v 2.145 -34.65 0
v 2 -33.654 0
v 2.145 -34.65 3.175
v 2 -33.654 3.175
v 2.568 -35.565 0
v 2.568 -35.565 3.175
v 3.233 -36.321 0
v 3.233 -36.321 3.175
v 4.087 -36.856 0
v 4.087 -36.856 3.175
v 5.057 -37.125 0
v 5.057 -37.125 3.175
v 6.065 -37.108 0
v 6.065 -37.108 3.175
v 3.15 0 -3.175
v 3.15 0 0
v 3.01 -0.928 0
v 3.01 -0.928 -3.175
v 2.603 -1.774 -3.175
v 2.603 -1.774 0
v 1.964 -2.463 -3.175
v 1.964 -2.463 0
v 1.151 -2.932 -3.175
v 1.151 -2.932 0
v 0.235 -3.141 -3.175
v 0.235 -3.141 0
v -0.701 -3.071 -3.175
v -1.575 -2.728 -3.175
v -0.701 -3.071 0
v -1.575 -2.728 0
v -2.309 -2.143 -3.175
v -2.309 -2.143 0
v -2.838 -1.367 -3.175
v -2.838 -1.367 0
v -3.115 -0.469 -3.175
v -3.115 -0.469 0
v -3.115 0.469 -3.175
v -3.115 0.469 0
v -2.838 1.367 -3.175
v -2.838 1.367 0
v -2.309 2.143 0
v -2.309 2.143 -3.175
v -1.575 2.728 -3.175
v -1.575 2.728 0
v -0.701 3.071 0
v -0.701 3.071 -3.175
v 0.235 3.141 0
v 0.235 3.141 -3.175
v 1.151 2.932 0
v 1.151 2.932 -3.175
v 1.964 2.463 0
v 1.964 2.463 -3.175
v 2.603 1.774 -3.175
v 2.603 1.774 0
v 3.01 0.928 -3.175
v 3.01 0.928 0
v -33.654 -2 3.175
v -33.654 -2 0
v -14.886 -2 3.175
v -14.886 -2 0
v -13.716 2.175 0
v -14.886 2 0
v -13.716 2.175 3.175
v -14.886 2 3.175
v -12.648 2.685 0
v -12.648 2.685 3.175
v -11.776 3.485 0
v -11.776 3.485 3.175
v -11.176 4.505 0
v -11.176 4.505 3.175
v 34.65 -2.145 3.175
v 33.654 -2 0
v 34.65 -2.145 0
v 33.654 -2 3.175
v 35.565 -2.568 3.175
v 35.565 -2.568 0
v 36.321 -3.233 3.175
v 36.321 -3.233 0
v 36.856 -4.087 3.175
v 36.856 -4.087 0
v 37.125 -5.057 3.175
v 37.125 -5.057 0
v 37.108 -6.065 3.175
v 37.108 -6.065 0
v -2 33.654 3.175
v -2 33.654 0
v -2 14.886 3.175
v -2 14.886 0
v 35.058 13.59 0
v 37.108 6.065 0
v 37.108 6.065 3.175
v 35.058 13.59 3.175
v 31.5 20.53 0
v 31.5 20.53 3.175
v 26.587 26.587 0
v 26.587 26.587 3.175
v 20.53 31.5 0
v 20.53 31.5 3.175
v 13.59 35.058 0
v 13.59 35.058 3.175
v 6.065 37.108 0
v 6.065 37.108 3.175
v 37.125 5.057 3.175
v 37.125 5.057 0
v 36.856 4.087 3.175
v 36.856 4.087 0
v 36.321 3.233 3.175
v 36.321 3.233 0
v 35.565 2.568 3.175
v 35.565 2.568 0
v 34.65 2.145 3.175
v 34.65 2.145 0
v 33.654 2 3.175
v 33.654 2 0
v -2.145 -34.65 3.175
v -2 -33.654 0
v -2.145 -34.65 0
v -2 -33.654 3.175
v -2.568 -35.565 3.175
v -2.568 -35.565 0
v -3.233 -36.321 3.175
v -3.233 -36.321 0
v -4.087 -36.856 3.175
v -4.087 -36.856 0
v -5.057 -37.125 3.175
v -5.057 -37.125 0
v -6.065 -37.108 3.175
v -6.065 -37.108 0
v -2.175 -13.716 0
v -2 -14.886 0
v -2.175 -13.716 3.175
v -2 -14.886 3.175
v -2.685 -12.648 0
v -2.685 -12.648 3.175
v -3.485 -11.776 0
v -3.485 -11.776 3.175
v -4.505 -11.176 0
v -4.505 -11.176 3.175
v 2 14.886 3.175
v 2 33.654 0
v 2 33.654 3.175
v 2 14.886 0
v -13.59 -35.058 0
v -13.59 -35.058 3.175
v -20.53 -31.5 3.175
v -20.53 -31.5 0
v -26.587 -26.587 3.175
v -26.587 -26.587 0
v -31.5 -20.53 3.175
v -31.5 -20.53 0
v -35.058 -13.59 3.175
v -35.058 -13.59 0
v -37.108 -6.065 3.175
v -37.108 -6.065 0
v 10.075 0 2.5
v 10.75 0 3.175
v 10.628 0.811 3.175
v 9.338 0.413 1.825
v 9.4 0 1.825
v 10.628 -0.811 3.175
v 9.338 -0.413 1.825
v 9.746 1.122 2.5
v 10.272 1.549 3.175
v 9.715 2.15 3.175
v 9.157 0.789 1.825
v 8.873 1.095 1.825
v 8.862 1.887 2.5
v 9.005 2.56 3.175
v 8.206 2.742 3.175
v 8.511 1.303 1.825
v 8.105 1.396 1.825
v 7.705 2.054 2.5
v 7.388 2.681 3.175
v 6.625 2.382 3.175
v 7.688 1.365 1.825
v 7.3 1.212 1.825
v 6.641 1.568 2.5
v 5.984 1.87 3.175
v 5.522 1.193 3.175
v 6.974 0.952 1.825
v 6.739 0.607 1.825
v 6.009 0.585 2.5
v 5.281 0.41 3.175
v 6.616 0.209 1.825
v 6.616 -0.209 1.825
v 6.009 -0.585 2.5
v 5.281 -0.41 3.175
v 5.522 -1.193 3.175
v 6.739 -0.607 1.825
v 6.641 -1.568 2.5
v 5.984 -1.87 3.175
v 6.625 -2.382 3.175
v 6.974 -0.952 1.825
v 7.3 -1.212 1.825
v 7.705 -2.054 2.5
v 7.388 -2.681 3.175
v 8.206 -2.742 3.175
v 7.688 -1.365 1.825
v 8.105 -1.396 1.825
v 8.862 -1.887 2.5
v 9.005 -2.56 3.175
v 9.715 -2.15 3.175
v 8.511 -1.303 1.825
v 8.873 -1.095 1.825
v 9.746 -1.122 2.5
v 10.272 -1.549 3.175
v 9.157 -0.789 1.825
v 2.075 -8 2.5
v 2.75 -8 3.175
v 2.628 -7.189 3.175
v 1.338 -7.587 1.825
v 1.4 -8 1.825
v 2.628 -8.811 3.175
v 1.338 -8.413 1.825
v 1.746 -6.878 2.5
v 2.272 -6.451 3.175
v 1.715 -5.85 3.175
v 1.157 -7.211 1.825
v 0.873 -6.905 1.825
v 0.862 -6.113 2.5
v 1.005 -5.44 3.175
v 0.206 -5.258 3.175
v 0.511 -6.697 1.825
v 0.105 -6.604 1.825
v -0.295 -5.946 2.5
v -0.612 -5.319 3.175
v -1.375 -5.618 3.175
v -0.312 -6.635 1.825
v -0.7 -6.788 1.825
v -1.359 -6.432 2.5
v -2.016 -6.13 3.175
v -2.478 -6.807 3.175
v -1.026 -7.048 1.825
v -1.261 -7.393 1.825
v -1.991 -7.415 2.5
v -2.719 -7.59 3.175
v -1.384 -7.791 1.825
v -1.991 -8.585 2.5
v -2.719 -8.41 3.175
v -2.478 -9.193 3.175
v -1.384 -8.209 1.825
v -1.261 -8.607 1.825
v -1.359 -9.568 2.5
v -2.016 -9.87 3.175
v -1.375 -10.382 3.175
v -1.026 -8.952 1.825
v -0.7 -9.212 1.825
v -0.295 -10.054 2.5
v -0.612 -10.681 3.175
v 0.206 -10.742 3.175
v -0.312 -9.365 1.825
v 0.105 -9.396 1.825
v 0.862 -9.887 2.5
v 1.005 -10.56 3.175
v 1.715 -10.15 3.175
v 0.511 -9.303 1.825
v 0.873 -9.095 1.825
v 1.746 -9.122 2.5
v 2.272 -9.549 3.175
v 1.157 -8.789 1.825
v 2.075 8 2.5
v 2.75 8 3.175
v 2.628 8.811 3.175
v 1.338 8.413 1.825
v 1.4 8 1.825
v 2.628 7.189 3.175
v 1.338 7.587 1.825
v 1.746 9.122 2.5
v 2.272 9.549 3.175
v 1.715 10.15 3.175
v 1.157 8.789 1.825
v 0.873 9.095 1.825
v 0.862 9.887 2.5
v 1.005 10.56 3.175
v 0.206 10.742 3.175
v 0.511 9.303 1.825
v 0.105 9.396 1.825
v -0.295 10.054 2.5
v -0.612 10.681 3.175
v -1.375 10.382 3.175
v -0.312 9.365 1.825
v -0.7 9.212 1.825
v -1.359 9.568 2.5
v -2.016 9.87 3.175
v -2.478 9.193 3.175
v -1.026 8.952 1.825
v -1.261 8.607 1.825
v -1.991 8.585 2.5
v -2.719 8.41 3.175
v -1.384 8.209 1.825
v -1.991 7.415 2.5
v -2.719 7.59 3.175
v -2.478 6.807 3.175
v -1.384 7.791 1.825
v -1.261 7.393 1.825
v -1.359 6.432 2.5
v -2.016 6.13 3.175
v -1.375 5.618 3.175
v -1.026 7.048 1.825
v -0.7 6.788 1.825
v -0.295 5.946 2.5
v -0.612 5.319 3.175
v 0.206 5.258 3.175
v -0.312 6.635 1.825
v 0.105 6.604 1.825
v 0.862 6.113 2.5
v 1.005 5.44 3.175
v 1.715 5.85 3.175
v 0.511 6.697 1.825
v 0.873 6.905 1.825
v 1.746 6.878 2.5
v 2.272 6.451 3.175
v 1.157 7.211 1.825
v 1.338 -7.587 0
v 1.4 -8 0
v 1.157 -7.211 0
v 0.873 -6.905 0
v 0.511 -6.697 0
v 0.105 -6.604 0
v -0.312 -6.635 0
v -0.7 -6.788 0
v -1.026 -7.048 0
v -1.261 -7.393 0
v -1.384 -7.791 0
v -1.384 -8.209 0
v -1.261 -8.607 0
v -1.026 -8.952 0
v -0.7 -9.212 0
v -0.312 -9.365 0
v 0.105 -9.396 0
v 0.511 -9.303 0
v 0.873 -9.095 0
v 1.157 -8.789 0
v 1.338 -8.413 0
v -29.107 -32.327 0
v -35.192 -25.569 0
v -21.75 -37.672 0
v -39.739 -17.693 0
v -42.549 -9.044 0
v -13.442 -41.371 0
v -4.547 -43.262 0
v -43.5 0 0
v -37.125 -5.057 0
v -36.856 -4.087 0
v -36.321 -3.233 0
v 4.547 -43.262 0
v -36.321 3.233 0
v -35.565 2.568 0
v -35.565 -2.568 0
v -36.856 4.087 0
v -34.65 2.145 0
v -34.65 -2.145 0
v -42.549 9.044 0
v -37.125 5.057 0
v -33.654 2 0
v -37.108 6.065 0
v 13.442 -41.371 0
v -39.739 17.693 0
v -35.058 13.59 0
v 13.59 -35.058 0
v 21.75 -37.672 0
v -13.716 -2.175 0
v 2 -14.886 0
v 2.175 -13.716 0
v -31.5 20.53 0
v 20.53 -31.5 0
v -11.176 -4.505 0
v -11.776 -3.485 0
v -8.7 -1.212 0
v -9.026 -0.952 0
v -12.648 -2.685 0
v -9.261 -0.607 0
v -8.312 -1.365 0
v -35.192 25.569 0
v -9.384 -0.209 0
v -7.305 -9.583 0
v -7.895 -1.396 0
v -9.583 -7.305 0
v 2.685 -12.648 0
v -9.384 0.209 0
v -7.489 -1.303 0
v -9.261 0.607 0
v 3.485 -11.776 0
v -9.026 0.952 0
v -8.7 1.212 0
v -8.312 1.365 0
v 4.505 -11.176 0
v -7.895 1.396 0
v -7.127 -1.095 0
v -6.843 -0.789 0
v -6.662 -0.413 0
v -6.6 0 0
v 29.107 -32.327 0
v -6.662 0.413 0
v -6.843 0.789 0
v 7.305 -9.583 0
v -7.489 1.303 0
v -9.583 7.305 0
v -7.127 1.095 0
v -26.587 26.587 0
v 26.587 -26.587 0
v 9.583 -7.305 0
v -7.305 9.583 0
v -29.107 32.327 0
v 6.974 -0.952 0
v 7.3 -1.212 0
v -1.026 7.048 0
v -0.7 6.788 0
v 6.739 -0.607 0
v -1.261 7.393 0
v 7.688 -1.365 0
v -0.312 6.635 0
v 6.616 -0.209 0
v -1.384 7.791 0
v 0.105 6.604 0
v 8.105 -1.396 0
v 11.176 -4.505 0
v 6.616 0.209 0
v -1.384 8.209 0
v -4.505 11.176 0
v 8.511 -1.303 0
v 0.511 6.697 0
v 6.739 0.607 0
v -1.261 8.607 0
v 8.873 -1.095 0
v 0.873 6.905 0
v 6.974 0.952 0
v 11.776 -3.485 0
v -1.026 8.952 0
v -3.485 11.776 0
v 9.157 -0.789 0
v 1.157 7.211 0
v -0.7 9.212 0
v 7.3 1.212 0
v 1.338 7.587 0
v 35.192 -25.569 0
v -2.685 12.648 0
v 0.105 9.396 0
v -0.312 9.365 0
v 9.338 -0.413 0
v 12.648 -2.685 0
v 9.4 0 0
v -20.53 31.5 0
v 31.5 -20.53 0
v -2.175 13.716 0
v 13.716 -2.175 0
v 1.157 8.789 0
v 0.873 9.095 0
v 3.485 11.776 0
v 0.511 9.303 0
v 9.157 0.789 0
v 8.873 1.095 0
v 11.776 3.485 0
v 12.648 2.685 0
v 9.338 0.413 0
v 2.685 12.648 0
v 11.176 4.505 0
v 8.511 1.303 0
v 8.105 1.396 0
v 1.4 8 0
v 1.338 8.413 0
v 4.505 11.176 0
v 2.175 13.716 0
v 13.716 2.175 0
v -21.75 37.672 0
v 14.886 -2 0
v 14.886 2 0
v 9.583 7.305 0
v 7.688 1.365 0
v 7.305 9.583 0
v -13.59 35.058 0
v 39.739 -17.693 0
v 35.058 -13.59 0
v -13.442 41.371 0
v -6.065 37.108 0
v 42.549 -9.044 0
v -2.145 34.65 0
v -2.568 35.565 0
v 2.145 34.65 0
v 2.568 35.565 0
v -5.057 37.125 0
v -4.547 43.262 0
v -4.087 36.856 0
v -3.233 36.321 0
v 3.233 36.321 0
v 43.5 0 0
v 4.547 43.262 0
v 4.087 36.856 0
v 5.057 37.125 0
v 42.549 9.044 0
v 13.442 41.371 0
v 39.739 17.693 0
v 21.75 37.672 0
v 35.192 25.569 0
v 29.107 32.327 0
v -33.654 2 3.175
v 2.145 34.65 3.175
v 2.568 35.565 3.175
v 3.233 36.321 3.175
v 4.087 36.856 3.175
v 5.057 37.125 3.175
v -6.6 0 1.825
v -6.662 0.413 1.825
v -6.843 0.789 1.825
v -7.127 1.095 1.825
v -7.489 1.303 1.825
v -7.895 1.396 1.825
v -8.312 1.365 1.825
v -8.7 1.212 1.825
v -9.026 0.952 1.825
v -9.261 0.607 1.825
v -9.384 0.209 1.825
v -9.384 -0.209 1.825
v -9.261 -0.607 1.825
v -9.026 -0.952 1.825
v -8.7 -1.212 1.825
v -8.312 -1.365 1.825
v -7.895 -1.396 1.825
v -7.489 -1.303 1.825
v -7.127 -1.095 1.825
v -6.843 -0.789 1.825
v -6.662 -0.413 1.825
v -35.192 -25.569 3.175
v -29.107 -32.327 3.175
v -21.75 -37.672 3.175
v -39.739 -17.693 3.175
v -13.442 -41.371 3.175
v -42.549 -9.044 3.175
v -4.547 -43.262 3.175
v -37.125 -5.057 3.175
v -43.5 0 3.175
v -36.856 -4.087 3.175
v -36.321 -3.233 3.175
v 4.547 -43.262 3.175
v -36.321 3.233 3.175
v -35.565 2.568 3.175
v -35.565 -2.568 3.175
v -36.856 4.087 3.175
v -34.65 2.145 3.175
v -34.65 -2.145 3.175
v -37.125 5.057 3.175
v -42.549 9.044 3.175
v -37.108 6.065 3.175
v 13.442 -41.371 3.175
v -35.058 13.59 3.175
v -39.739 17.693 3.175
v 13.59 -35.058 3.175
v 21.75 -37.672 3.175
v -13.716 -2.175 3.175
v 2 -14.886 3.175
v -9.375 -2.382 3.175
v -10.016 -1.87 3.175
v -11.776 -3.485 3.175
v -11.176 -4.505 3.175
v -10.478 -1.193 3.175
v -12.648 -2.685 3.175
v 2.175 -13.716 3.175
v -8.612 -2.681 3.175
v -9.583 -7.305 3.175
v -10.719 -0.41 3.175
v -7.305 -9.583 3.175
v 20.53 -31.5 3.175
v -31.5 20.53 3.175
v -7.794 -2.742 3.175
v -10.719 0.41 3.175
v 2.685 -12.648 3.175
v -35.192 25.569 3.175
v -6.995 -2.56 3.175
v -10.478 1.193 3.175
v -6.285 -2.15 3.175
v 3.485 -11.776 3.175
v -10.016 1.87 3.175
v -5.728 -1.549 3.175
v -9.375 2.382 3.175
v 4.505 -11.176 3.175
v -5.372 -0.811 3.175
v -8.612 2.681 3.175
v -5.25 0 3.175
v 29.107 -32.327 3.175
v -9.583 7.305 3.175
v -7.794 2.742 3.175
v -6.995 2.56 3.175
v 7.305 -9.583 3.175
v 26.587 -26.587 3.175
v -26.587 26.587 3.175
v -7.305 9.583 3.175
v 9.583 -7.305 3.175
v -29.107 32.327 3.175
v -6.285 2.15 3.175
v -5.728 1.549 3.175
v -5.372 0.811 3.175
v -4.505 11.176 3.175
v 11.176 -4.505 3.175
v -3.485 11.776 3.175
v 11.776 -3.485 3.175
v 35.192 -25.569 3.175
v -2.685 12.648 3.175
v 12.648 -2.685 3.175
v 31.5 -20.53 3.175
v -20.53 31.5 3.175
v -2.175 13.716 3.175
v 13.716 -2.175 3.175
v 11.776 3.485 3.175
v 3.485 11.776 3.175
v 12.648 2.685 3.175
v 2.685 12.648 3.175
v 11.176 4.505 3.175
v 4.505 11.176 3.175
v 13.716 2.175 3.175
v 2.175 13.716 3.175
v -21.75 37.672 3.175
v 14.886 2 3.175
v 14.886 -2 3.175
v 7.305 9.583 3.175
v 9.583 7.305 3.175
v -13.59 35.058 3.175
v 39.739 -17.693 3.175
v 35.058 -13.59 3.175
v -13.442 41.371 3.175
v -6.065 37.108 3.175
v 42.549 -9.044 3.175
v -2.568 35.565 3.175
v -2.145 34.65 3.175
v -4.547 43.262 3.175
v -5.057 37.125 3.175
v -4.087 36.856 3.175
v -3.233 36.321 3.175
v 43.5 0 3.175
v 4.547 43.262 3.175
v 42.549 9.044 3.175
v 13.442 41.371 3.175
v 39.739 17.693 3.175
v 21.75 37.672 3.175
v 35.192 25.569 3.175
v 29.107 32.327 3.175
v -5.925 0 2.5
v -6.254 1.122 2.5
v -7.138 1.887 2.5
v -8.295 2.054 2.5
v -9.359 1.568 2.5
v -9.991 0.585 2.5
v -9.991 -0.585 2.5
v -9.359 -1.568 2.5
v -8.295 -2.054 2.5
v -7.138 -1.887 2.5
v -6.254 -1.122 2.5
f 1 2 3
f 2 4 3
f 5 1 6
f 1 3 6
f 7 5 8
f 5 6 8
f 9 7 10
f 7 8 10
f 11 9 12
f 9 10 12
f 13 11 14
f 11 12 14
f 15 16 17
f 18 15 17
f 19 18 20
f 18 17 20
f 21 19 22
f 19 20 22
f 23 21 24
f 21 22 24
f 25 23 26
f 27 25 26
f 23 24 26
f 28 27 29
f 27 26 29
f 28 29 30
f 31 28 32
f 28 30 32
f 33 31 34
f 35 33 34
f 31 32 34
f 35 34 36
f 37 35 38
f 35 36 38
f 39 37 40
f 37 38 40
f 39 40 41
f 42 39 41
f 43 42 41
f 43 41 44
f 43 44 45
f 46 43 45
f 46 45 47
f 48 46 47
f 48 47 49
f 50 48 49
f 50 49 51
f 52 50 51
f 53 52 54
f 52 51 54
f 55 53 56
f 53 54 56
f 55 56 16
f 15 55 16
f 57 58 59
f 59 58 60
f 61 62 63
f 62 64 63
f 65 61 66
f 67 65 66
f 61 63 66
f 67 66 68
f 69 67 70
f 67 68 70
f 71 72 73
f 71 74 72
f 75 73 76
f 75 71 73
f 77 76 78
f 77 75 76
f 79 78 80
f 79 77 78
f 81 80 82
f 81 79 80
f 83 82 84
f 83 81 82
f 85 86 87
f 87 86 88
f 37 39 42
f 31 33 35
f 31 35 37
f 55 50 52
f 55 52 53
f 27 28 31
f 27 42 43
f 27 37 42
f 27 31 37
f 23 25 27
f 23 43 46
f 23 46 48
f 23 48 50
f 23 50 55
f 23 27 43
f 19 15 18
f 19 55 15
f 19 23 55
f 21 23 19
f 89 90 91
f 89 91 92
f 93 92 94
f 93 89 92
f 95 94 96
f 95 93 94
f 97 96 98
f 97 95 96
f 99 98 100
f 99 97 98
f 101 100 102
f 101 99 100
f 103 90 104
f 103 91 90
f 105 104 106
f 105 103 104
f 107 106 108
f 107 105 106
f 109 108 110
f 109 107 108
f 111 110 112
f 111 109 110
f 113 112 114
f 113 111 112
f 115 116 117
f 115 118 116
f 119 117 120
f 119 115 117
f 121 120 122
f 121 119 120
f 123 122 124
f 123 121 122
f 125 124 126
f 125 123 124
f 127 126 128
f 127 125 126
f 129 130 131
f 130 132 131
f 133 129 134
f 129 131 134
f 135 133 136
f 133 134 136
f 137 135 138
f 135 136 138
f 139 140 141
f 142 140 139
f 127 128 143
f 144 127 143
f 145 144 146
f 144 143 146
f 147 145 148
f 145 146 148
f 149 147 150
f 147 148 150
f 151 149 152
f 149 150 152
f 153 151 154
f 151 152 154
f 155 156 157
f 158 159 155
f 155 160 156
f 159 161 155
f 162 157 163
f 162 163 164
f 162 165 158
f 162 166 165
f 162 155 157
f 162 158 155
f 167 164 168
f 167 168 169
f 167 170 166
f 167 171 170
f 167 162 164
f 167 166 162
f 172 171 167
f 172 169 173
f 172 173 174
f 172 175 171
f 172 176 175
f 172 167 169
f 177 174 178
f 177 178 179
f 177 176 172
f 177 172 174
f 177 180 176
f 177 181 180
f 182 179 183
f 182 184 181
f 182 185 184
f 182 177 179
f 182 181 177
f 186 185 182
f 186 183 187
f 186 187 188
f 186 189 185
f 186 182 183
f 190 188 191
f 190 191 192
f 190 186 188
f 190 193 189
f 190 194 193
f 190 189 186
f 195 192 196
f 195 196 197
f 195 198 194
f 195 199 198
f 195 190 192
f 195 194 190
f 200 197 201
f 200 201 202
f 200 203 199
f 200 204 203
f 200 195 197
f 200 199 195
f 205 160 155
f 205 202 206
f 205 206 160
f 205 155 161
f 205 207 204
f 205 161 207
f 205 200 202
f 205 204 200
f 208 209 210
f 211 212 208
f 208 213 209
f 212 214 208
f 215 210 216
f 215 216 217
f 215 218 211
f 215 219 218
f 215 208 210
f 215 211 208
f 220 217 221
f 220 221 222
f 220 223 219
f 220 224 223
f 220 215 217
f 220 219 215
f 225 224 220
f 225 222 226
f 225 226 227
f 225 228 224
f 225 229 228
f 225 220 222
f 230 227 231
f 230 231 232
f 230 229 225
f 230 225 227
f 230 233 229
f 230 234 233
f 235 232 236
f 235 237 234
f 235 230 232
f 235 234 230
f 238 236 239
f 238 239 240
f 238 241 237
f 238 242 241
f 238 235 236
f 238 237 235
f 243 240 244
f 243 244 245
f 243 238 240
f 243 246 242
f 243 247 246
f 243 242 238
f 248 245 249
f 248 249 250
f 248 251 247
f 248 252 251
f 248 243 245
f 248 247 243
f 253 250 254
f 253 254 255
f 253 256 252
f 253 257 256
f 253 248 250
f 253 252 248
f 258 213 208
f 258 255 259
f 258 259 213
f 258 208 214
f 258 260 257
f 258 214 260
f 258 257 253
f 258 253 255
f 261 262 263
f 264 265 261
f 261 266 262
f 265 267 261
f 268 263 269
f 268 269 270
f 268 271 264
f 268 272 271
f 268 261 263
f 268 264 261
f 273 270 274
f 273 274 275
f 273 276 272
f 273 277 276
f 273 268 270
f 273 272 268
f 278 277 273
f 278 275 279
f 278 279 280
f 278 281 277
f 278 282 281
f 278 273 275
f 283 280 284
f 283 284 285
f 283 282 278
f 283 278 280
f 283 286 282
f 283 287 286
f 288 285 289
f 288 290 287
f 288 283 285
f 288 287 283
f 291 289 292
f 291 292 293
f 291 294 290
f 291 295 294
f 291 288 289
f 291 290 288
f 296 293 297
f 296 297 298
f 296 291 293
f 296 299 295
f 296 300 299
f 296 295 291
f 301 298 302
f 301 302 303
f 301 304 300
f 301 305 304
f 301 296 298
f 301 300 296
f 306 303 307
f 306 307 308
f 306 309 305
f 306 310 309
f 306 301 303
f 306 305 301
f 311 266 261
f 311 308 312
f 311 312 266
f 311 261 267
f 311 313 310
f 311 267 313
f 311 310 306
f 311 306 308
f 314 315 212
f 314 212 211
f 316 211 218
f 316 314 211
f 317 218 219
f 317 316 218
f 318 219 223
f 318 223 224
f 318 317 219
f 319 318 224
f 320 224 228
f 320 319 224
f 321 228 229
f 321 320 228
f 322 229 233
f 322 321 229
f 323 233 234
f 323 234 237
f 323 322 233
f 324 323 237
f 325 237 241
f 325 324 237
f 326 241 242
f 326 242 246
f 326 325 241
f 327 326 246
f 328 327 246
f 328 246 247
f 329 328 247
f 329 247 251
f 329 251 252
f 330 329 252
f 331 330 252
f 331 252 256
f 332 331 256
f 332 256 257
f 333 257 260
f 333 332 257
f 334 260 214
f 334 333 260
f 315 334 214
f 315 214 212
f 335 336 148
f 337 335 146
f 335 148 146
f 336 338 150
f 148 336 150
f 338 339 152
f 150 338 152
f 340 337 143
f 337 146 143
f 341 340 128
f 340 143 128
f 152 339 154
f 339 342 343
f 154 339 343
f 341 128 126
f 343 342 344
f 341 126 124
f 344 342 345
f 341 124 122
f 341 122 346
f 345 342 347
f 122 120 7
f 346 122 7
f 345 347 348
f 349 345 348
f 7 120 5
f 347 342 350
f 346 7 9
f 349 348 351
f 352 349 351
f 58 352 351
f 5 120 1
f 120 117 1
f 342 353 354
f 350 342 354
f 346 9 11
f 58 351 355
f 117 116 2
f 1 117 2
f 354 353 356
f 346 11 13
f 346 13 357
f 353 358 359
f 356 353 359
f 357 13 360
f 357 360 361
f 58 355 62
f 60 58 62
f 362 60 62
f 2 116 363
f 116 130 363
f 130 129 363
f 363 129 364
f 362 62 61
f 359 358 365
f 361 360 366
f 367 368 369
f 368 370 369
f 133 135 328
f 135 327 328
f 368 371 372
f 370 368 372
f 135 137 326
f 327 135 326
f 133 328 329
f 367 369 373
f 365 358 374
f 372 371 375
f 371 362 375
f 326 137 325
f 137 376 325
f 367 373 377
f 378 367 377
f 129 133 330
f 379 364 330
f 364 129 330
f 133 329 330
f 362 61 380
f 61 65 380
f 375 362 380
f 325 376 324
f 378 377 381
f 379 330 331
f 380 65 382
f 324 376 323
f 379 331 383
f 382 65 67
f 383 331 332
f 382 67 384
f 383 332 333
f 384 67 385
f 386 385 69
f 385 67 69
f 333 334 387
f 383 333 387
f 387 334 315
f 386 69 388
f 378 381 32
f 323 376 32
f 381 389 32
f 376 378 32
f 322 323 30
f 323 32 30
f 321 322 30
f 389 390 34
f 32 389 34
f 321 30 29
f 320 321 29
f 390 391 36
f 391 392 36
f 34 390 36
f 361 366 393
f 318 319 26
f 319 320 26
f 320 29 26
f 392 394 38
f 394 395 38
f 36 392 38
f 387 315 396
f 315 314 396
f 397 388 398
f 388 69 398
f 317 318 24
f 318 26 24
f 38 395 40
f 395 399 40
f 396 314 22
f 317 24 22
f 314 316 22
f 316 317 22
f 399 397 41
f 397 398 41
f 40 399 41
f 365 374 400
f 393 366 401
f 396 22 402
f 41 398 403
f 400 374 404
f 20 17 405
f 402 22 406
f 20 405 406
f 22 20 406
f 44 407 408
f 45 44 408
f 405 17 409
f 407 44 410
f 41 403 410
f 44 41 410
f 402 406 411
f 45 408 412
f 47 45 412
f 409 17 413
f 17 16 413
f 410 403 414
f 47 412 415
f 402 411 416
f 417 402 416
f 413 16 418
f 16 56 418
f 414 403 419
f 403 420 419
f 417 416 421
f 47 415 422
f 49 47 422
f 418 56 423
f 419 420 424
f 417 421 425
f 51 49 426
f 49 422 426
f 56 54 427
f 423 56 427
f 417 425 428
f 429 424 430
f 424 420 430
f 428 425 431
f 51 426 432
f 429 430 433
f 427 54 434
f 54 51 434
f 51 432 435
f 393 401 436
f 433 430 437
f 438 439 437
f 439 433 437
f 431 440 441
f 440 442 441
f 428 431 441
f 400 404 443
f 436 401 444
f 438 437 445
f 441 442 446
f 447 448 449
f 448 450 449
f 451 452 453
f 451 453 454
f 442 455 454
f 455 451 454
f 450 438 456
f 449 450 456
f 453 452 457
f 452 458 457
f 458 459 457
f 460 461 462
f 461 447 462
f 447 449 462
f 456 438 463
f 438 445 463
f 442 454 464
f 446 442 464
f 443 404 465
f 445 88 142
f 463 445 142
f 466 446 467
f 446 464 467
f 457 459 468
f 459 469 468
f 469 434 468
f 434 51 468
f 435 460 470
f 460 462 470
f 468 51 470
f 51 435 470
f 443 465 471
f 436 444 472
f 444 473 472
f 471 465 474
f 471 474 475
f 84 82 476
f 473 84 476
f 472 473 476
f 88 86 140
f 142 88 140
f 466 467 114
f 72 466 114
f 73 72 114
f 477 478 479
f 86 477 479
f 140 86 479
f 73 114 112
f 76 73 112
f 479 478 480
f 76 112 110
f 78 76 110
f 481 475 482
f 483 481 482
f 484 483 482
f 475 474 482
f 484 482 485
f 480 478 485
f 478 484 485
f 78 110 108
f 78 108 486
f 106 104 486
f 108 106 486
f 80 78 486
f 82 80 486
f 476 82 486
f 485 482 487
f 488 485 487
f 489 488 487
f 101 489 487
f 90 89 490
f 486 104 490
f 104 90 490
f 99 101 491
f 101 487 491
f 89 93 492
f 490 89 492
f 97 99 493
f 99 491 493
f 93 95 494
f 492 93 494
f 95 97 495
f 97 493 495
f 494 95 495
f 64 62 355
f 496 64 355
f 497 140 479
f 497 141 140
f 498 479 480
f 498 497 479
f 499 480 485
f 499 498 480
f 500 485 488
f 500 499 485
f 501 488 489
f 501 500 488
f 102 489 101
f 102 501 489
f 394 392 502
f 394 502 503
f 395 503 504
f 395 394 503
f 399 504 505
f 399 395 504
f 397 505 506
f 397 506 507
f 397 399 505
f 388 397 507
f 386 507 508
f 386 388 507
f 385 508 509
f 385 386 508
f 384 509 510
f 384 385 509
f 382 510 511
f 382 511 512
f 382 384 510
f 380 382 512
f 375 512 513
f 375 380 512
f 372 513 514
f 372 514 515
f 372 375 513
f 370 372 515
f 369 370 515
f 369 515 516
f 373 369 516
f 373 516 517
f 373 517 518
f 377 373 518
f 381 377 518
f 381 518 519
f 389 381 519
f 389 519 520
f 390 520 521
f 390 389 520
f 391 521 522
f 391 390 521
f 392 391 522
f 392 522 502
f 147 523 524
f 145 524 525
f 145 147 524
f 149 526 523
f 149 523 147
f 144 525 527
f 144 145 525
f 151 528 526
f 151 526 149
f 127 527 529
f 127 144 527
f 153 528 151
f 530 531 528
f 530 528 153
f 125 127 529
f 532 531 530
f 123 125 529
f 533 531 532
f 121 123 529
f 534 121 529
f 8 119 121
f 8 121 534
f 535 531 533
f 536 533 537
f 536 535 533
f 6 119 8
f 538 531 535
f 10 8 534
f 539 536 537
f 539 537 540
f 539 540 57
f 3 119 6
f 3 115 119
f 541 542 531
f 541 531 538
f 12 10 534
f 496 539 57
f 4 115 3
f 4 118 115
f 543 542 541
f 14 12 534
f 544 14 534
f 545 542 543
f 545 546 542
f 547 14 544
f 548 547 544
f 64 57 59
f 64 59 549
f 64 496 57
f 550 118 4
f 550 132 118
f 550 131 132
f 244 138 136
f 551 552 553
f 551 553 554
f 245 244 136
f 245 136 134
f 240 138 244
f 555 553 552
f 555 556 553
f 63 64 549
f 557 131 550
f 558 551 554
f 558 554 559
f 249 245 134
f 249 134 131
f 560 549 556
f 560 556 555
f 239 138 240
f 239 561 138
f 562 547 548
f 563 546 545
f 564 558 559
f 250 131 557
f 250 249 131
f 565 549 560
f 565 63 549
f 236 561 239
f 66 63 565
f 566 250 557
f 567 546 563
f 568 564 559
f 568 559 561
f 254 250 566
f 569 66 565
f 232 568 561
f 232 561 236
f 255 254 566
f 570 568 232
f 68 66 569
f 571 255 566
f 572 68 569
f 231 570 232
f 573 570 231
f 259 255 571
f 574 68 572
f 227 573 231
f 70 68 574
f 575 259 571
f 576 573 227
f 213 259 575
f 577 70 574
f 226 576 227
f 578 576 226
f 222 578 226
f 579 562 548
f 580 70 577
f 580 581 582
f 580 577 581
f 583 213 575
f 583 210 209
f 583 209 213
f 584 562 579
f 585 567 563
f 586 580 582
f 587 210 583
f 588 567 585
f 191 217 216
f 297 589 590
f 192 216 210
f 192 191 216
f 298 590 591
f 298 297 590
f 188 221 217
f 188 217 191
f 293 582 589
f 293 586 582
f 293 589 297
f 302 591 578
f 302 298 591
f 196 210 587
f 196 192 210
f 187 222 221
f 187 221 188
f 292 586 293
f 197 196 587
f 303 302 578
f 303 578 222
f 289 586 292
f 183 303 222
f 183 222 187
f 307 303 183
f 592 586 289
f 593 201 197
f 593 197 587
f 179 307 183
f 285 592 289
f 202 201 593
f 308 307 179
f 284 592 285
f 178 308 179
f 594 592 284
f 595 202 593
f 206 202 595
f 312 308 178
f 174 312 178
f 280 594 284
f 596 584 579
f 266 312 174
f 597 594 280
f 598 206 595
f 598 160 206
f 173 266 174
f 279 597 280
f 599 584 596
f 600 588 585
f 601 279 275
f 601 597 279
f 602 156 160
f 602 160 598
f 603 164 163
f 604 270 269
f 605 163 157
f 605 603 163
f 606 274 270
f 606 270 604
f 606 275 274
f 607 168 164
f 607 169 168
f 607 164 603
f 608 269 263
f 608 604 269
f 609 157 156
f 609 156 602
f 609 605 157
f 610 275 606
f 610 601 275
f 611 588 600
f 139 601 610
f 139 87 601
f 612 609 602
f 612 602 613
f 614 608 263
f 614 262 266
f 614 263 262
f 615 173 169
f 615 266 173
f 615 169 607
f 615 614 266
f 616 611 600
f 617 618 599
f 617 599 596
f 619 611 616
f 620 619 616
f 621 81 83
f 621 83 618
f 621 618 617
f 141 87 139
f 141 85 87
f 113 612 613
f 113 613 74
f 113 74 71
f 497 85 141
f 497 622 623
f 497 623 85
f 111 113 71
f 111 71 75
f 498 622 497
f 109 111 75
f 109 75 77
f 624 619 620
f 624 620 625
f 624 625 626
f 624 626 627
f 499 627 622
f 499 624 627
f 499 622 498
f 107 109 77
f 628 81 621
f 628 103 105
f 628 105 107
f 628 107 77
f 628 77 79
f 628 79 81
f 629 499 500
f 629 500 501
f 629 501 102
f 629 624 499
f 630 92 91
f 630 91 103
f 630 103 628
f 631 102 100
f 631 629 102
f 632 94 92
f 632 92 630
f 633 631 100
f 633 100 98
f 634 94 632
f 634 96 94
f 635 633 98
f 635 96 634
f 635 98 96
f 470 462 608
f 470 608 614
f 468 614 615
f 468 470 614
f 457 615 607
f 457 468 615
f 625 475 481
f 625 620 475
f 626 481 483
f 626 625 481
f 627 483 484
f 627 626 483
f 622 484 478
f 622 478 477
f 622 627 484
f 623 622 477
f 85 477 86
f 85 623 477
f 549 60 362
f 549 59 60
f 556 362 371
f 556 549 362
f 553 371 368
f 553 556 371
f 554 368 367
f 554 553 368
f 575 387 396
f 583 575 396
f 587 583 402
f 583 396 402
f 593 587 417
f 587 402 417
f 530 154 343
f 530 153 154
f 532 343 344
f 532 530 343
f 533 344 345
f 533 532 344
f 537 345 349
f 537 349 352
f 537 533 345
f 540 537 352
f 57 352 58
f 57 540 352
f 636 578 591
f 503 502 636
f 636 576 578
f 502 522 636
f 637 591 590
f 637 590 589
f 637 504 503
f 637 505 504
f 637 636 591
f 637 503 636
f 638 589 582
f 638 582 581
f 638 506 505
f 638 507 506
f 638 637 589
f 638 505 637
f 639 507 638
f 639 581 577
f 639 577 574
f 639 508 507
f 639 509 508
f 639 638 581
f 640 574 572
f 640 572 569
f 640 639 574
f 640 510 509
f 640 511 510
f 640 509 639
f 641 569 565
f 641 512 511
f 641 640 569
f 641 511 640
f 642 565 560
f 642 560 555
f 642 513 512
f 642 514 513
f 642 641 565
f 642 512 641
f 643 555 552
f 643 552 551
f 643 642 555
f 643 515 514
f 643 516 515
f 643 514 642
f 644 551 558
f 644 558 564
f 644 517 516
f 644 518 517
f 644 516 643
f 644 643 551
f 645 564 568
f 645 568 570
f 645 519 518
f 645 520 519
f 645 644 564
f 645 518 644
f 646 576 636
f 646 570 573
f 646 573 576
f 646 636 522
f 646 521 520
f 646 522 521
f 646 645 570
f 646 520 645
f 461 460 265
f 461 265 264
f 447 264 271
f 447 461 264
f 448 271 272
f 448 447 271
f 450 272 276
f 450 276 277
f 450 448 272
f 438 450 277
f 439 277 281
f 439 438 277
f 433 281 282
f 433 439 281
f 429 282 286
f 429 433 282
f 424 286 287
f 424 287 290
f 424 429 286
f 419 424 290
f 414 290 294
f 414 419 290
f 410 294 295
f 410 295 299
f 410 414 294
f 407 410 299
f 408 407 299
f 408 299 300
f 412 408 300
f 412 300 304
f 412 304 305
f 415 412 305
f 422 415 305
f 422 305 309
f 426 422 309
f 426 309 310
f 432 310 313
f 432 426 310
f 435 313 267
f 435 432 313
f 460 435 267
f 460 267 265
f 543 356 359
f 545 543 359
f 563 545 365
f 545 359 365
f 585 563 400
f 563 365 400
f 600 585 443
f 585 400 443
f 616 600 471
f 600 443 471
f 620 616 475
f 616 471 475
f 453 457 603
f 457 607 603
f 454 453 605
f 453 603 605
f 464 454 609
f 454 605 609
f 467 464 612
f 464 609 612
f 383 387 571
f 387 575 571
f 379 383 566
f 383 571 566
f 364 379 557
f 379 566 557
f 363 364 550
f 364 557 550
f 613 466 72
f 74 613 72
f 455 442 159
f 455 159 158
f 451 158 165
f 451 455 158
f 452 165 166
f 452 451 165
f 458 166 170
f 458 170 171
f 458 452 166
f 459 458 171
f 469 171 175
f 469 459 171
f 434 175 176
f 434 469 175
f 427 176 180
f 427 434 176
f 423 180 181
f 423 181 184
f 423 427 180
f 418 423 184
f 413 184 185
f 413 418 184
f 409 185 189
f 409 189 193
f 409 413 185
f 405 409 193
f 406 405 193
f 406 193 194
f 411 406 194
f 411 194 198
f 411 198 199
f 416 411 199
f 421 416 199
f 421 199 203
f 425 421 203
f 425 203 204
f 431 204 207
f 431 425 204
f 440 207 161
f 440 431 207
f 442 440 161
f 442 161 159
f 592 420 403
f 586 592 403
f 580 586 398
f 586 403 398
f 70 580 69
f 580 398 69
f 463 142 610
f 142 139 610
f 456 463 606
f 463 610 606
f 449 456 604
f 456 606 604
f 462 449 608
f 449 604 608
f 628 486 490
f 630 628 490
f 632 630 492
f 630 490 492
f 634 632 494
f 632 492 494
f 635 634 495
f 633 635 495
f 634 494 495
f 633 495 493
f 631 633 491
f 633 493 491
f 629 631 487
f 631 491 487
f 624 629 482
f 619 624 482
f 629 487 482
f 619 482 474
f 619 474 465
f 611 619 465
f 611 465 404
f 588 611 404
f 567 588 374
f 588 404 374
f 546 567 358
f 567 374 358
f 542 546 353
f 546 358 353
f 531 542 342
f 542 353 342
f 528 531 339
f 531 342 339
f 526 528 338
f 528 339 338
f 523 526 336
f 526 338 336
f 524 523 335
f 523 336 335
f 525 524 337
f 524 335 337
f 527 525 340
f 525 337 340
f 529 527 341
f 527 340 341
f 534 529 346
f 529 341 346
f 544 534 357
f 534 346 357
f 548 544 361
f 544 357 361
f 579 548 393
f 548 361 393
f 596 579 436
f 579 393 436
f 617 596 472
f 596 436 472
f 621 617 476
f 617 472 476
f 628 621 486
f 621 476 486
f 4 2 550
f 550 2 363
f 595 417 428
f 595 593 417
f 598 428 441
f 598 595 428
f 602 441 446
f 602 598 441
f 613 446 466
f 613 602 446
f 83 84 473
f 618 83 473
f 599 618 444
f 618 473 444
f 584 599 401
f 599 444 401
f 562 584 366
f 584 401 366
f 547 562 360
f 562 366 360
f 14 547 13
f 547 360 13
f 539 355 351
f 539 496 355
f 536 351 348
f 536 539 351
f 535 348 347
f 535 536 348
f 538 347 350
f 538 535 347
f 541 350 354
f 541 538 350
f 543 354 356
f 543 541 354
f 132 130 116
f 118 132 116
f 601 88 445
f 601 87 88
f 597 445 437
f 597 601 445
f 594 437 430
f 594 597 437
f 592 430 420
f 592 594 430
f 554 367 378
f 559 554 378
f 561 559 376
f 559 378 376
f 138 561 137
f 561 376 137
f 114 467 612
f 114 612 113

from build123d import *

# Parameters (mm, degrees)
SKETCH1_R           = 43.5
SKETCH1_R_2         = 1.4
BOSS_EXTRUDE1_DEPTH = 3.175
FILLET1_R           = 4
FILLET2_R           = 3.5
SKETCH3_R           = 3.15
BOSS_EXTRUDE2_DEPTH = 3.175
CHAMFER1_SIZE       = 1.35


with BuildPart() as part:
    # Sketch1 → Boss-Extrude1 (new body)
    with BuildSketch(Plane.XY):
        Circle(SKETCH1_R)
        with Locations((0, 8)):
            Circle(SKETCH1_R_2, mode=Mode.SUBTRACT)
        with Locations((0, -8)):
            Circle(SKETCH1_R_2, mode=Mode.SUBTRACT)
        with Locations((8, 0)):
            Circle(SKETCH1_R_2, mode=Mode.SUBTRACT)
        with Locations((-8, 0)):
            Circle(SKETCH1_R_2, mode=Mode.SUBTRACT)
        with BuildLine():
            Line((-37.546770833, -2), (-11.882865816, -2))
            ThreePointArc((-11.882865816, -2), (-8.520636713, -8.520636713), (-2, -11.882865816))
            Line((-2, -11.882865816), (-2, -37.546770833))
            ThreePointArc((-2, -37.546770833), (-26.587214973, -26.587214973), (-37.546770833, -2))
        make_face(mode=Mode.SUBTRACT)
        with BuildLine():
            Line((-2, 37.546770833), (-2, 11.882865816))
            ThreePointArc((-2, 11.882865816), (-8.520636713, 8.520636713), (-11.882865816, 2))
            Line((-11.882865816, 2), (-37.546770833, 2))
            ThreePointArc((-37.546770833, 2), (-26.587214973, 26.587214973), (-2, 37.546770833))
        make_face(mode=Mode.SUBTRACT)
        with BuildLine():
            Line((2, 37.546770833), (2, 11.882865816))
            ThreePointArc((2, 11.882865816), (8.520636713, 8.520636713), (11.882865816, 2))
            Line((11.882865816, 2), (37.546770833, 2))
            ThreePointArc((37.546770833, 2), (26.587214973, 26.587214973), (2, 37.546770833))
        make_face(mode=Mode.SUBTRACT)
        with BuildLine():
            Line((11.882865816, -2), (37.546770833, -2))
            ThreePointArc((37.546770833, -2), (26.587214973, -26.587214973), (2, -37.546770833))
            Line((2, -37.546770833), (2, -11.882865816))
            ThreePointArc((2, -11.882865816), (8.520636713, -8.520636713), (11.882865816, -2))
        make_face(mode=Mode.SUBTRACT)
    extrude(amount=BOSS_EXTRUDE1_DEPTH)

    # Fillet1
    fillet1_edges = [part.edges().sort_by_distance(p)[0] for p in [
        (-11.882865816, 2, 1.5875),
        (-2, 11.882865816, 1.5875),
        (-2, -11.882865816, 1.5875),
        (-11.882865816, -2, 1.5875),
        (11.882865816, -2, 1.5875),
        (2, -11.882865816, 1.5875),
        (2, 11.882865816, 1.5875),
        (11.882865816, 2, 1.5875),
    ]]
    fillet(fillet1_edges, radius=FILLET1_R)

    # Fillet2
    fillet2_edges = [part.edges().sort_by_distance(p)[0] for p in [
        (-2, 37.546770833, 1.5875),
        (-37.546770833, 2, 1.5875),
        (-37.546770833, -2, 1.5875),
        (-2, -37.546770833, 1.5875),
        (2, -37.546770833, 1.5875),
        (37.546770833, -2, 1.5875),
        (37.546770833, 2, 1.5875),
        (2, 37.546770833, 1.5875),
    ]]
    fillet(fillet2_edges, radius=FILLET2_R)

    # Sketch3 → Boss-Extrude2 (add)
    with BuildSketch(Plane(origin=(0, 0, 0), x_dir=(-1, 0, 0), z_dir=(0, 0, -1))):
        with Locations(Location((0, 0, 0), (0, 0, 180))):
            Circle(SKETCH3_R)
    extrude(amount=BOSS_EXTRUDE2_DEPTH)

    # Chamfer1
    chamfer1_edges = [part.edges().sort_by_distance(p)[0] for p in [
        (6.6, 0, 3.175),
        (-9.4, 0, 3.175),
        (-1.4, 8, 3.175),
        (-1.4, -8, 3.175),
    ]]
    chamfer(chamfer1_edges, length=CHAMFER1_SIZE)


solid = part.part
